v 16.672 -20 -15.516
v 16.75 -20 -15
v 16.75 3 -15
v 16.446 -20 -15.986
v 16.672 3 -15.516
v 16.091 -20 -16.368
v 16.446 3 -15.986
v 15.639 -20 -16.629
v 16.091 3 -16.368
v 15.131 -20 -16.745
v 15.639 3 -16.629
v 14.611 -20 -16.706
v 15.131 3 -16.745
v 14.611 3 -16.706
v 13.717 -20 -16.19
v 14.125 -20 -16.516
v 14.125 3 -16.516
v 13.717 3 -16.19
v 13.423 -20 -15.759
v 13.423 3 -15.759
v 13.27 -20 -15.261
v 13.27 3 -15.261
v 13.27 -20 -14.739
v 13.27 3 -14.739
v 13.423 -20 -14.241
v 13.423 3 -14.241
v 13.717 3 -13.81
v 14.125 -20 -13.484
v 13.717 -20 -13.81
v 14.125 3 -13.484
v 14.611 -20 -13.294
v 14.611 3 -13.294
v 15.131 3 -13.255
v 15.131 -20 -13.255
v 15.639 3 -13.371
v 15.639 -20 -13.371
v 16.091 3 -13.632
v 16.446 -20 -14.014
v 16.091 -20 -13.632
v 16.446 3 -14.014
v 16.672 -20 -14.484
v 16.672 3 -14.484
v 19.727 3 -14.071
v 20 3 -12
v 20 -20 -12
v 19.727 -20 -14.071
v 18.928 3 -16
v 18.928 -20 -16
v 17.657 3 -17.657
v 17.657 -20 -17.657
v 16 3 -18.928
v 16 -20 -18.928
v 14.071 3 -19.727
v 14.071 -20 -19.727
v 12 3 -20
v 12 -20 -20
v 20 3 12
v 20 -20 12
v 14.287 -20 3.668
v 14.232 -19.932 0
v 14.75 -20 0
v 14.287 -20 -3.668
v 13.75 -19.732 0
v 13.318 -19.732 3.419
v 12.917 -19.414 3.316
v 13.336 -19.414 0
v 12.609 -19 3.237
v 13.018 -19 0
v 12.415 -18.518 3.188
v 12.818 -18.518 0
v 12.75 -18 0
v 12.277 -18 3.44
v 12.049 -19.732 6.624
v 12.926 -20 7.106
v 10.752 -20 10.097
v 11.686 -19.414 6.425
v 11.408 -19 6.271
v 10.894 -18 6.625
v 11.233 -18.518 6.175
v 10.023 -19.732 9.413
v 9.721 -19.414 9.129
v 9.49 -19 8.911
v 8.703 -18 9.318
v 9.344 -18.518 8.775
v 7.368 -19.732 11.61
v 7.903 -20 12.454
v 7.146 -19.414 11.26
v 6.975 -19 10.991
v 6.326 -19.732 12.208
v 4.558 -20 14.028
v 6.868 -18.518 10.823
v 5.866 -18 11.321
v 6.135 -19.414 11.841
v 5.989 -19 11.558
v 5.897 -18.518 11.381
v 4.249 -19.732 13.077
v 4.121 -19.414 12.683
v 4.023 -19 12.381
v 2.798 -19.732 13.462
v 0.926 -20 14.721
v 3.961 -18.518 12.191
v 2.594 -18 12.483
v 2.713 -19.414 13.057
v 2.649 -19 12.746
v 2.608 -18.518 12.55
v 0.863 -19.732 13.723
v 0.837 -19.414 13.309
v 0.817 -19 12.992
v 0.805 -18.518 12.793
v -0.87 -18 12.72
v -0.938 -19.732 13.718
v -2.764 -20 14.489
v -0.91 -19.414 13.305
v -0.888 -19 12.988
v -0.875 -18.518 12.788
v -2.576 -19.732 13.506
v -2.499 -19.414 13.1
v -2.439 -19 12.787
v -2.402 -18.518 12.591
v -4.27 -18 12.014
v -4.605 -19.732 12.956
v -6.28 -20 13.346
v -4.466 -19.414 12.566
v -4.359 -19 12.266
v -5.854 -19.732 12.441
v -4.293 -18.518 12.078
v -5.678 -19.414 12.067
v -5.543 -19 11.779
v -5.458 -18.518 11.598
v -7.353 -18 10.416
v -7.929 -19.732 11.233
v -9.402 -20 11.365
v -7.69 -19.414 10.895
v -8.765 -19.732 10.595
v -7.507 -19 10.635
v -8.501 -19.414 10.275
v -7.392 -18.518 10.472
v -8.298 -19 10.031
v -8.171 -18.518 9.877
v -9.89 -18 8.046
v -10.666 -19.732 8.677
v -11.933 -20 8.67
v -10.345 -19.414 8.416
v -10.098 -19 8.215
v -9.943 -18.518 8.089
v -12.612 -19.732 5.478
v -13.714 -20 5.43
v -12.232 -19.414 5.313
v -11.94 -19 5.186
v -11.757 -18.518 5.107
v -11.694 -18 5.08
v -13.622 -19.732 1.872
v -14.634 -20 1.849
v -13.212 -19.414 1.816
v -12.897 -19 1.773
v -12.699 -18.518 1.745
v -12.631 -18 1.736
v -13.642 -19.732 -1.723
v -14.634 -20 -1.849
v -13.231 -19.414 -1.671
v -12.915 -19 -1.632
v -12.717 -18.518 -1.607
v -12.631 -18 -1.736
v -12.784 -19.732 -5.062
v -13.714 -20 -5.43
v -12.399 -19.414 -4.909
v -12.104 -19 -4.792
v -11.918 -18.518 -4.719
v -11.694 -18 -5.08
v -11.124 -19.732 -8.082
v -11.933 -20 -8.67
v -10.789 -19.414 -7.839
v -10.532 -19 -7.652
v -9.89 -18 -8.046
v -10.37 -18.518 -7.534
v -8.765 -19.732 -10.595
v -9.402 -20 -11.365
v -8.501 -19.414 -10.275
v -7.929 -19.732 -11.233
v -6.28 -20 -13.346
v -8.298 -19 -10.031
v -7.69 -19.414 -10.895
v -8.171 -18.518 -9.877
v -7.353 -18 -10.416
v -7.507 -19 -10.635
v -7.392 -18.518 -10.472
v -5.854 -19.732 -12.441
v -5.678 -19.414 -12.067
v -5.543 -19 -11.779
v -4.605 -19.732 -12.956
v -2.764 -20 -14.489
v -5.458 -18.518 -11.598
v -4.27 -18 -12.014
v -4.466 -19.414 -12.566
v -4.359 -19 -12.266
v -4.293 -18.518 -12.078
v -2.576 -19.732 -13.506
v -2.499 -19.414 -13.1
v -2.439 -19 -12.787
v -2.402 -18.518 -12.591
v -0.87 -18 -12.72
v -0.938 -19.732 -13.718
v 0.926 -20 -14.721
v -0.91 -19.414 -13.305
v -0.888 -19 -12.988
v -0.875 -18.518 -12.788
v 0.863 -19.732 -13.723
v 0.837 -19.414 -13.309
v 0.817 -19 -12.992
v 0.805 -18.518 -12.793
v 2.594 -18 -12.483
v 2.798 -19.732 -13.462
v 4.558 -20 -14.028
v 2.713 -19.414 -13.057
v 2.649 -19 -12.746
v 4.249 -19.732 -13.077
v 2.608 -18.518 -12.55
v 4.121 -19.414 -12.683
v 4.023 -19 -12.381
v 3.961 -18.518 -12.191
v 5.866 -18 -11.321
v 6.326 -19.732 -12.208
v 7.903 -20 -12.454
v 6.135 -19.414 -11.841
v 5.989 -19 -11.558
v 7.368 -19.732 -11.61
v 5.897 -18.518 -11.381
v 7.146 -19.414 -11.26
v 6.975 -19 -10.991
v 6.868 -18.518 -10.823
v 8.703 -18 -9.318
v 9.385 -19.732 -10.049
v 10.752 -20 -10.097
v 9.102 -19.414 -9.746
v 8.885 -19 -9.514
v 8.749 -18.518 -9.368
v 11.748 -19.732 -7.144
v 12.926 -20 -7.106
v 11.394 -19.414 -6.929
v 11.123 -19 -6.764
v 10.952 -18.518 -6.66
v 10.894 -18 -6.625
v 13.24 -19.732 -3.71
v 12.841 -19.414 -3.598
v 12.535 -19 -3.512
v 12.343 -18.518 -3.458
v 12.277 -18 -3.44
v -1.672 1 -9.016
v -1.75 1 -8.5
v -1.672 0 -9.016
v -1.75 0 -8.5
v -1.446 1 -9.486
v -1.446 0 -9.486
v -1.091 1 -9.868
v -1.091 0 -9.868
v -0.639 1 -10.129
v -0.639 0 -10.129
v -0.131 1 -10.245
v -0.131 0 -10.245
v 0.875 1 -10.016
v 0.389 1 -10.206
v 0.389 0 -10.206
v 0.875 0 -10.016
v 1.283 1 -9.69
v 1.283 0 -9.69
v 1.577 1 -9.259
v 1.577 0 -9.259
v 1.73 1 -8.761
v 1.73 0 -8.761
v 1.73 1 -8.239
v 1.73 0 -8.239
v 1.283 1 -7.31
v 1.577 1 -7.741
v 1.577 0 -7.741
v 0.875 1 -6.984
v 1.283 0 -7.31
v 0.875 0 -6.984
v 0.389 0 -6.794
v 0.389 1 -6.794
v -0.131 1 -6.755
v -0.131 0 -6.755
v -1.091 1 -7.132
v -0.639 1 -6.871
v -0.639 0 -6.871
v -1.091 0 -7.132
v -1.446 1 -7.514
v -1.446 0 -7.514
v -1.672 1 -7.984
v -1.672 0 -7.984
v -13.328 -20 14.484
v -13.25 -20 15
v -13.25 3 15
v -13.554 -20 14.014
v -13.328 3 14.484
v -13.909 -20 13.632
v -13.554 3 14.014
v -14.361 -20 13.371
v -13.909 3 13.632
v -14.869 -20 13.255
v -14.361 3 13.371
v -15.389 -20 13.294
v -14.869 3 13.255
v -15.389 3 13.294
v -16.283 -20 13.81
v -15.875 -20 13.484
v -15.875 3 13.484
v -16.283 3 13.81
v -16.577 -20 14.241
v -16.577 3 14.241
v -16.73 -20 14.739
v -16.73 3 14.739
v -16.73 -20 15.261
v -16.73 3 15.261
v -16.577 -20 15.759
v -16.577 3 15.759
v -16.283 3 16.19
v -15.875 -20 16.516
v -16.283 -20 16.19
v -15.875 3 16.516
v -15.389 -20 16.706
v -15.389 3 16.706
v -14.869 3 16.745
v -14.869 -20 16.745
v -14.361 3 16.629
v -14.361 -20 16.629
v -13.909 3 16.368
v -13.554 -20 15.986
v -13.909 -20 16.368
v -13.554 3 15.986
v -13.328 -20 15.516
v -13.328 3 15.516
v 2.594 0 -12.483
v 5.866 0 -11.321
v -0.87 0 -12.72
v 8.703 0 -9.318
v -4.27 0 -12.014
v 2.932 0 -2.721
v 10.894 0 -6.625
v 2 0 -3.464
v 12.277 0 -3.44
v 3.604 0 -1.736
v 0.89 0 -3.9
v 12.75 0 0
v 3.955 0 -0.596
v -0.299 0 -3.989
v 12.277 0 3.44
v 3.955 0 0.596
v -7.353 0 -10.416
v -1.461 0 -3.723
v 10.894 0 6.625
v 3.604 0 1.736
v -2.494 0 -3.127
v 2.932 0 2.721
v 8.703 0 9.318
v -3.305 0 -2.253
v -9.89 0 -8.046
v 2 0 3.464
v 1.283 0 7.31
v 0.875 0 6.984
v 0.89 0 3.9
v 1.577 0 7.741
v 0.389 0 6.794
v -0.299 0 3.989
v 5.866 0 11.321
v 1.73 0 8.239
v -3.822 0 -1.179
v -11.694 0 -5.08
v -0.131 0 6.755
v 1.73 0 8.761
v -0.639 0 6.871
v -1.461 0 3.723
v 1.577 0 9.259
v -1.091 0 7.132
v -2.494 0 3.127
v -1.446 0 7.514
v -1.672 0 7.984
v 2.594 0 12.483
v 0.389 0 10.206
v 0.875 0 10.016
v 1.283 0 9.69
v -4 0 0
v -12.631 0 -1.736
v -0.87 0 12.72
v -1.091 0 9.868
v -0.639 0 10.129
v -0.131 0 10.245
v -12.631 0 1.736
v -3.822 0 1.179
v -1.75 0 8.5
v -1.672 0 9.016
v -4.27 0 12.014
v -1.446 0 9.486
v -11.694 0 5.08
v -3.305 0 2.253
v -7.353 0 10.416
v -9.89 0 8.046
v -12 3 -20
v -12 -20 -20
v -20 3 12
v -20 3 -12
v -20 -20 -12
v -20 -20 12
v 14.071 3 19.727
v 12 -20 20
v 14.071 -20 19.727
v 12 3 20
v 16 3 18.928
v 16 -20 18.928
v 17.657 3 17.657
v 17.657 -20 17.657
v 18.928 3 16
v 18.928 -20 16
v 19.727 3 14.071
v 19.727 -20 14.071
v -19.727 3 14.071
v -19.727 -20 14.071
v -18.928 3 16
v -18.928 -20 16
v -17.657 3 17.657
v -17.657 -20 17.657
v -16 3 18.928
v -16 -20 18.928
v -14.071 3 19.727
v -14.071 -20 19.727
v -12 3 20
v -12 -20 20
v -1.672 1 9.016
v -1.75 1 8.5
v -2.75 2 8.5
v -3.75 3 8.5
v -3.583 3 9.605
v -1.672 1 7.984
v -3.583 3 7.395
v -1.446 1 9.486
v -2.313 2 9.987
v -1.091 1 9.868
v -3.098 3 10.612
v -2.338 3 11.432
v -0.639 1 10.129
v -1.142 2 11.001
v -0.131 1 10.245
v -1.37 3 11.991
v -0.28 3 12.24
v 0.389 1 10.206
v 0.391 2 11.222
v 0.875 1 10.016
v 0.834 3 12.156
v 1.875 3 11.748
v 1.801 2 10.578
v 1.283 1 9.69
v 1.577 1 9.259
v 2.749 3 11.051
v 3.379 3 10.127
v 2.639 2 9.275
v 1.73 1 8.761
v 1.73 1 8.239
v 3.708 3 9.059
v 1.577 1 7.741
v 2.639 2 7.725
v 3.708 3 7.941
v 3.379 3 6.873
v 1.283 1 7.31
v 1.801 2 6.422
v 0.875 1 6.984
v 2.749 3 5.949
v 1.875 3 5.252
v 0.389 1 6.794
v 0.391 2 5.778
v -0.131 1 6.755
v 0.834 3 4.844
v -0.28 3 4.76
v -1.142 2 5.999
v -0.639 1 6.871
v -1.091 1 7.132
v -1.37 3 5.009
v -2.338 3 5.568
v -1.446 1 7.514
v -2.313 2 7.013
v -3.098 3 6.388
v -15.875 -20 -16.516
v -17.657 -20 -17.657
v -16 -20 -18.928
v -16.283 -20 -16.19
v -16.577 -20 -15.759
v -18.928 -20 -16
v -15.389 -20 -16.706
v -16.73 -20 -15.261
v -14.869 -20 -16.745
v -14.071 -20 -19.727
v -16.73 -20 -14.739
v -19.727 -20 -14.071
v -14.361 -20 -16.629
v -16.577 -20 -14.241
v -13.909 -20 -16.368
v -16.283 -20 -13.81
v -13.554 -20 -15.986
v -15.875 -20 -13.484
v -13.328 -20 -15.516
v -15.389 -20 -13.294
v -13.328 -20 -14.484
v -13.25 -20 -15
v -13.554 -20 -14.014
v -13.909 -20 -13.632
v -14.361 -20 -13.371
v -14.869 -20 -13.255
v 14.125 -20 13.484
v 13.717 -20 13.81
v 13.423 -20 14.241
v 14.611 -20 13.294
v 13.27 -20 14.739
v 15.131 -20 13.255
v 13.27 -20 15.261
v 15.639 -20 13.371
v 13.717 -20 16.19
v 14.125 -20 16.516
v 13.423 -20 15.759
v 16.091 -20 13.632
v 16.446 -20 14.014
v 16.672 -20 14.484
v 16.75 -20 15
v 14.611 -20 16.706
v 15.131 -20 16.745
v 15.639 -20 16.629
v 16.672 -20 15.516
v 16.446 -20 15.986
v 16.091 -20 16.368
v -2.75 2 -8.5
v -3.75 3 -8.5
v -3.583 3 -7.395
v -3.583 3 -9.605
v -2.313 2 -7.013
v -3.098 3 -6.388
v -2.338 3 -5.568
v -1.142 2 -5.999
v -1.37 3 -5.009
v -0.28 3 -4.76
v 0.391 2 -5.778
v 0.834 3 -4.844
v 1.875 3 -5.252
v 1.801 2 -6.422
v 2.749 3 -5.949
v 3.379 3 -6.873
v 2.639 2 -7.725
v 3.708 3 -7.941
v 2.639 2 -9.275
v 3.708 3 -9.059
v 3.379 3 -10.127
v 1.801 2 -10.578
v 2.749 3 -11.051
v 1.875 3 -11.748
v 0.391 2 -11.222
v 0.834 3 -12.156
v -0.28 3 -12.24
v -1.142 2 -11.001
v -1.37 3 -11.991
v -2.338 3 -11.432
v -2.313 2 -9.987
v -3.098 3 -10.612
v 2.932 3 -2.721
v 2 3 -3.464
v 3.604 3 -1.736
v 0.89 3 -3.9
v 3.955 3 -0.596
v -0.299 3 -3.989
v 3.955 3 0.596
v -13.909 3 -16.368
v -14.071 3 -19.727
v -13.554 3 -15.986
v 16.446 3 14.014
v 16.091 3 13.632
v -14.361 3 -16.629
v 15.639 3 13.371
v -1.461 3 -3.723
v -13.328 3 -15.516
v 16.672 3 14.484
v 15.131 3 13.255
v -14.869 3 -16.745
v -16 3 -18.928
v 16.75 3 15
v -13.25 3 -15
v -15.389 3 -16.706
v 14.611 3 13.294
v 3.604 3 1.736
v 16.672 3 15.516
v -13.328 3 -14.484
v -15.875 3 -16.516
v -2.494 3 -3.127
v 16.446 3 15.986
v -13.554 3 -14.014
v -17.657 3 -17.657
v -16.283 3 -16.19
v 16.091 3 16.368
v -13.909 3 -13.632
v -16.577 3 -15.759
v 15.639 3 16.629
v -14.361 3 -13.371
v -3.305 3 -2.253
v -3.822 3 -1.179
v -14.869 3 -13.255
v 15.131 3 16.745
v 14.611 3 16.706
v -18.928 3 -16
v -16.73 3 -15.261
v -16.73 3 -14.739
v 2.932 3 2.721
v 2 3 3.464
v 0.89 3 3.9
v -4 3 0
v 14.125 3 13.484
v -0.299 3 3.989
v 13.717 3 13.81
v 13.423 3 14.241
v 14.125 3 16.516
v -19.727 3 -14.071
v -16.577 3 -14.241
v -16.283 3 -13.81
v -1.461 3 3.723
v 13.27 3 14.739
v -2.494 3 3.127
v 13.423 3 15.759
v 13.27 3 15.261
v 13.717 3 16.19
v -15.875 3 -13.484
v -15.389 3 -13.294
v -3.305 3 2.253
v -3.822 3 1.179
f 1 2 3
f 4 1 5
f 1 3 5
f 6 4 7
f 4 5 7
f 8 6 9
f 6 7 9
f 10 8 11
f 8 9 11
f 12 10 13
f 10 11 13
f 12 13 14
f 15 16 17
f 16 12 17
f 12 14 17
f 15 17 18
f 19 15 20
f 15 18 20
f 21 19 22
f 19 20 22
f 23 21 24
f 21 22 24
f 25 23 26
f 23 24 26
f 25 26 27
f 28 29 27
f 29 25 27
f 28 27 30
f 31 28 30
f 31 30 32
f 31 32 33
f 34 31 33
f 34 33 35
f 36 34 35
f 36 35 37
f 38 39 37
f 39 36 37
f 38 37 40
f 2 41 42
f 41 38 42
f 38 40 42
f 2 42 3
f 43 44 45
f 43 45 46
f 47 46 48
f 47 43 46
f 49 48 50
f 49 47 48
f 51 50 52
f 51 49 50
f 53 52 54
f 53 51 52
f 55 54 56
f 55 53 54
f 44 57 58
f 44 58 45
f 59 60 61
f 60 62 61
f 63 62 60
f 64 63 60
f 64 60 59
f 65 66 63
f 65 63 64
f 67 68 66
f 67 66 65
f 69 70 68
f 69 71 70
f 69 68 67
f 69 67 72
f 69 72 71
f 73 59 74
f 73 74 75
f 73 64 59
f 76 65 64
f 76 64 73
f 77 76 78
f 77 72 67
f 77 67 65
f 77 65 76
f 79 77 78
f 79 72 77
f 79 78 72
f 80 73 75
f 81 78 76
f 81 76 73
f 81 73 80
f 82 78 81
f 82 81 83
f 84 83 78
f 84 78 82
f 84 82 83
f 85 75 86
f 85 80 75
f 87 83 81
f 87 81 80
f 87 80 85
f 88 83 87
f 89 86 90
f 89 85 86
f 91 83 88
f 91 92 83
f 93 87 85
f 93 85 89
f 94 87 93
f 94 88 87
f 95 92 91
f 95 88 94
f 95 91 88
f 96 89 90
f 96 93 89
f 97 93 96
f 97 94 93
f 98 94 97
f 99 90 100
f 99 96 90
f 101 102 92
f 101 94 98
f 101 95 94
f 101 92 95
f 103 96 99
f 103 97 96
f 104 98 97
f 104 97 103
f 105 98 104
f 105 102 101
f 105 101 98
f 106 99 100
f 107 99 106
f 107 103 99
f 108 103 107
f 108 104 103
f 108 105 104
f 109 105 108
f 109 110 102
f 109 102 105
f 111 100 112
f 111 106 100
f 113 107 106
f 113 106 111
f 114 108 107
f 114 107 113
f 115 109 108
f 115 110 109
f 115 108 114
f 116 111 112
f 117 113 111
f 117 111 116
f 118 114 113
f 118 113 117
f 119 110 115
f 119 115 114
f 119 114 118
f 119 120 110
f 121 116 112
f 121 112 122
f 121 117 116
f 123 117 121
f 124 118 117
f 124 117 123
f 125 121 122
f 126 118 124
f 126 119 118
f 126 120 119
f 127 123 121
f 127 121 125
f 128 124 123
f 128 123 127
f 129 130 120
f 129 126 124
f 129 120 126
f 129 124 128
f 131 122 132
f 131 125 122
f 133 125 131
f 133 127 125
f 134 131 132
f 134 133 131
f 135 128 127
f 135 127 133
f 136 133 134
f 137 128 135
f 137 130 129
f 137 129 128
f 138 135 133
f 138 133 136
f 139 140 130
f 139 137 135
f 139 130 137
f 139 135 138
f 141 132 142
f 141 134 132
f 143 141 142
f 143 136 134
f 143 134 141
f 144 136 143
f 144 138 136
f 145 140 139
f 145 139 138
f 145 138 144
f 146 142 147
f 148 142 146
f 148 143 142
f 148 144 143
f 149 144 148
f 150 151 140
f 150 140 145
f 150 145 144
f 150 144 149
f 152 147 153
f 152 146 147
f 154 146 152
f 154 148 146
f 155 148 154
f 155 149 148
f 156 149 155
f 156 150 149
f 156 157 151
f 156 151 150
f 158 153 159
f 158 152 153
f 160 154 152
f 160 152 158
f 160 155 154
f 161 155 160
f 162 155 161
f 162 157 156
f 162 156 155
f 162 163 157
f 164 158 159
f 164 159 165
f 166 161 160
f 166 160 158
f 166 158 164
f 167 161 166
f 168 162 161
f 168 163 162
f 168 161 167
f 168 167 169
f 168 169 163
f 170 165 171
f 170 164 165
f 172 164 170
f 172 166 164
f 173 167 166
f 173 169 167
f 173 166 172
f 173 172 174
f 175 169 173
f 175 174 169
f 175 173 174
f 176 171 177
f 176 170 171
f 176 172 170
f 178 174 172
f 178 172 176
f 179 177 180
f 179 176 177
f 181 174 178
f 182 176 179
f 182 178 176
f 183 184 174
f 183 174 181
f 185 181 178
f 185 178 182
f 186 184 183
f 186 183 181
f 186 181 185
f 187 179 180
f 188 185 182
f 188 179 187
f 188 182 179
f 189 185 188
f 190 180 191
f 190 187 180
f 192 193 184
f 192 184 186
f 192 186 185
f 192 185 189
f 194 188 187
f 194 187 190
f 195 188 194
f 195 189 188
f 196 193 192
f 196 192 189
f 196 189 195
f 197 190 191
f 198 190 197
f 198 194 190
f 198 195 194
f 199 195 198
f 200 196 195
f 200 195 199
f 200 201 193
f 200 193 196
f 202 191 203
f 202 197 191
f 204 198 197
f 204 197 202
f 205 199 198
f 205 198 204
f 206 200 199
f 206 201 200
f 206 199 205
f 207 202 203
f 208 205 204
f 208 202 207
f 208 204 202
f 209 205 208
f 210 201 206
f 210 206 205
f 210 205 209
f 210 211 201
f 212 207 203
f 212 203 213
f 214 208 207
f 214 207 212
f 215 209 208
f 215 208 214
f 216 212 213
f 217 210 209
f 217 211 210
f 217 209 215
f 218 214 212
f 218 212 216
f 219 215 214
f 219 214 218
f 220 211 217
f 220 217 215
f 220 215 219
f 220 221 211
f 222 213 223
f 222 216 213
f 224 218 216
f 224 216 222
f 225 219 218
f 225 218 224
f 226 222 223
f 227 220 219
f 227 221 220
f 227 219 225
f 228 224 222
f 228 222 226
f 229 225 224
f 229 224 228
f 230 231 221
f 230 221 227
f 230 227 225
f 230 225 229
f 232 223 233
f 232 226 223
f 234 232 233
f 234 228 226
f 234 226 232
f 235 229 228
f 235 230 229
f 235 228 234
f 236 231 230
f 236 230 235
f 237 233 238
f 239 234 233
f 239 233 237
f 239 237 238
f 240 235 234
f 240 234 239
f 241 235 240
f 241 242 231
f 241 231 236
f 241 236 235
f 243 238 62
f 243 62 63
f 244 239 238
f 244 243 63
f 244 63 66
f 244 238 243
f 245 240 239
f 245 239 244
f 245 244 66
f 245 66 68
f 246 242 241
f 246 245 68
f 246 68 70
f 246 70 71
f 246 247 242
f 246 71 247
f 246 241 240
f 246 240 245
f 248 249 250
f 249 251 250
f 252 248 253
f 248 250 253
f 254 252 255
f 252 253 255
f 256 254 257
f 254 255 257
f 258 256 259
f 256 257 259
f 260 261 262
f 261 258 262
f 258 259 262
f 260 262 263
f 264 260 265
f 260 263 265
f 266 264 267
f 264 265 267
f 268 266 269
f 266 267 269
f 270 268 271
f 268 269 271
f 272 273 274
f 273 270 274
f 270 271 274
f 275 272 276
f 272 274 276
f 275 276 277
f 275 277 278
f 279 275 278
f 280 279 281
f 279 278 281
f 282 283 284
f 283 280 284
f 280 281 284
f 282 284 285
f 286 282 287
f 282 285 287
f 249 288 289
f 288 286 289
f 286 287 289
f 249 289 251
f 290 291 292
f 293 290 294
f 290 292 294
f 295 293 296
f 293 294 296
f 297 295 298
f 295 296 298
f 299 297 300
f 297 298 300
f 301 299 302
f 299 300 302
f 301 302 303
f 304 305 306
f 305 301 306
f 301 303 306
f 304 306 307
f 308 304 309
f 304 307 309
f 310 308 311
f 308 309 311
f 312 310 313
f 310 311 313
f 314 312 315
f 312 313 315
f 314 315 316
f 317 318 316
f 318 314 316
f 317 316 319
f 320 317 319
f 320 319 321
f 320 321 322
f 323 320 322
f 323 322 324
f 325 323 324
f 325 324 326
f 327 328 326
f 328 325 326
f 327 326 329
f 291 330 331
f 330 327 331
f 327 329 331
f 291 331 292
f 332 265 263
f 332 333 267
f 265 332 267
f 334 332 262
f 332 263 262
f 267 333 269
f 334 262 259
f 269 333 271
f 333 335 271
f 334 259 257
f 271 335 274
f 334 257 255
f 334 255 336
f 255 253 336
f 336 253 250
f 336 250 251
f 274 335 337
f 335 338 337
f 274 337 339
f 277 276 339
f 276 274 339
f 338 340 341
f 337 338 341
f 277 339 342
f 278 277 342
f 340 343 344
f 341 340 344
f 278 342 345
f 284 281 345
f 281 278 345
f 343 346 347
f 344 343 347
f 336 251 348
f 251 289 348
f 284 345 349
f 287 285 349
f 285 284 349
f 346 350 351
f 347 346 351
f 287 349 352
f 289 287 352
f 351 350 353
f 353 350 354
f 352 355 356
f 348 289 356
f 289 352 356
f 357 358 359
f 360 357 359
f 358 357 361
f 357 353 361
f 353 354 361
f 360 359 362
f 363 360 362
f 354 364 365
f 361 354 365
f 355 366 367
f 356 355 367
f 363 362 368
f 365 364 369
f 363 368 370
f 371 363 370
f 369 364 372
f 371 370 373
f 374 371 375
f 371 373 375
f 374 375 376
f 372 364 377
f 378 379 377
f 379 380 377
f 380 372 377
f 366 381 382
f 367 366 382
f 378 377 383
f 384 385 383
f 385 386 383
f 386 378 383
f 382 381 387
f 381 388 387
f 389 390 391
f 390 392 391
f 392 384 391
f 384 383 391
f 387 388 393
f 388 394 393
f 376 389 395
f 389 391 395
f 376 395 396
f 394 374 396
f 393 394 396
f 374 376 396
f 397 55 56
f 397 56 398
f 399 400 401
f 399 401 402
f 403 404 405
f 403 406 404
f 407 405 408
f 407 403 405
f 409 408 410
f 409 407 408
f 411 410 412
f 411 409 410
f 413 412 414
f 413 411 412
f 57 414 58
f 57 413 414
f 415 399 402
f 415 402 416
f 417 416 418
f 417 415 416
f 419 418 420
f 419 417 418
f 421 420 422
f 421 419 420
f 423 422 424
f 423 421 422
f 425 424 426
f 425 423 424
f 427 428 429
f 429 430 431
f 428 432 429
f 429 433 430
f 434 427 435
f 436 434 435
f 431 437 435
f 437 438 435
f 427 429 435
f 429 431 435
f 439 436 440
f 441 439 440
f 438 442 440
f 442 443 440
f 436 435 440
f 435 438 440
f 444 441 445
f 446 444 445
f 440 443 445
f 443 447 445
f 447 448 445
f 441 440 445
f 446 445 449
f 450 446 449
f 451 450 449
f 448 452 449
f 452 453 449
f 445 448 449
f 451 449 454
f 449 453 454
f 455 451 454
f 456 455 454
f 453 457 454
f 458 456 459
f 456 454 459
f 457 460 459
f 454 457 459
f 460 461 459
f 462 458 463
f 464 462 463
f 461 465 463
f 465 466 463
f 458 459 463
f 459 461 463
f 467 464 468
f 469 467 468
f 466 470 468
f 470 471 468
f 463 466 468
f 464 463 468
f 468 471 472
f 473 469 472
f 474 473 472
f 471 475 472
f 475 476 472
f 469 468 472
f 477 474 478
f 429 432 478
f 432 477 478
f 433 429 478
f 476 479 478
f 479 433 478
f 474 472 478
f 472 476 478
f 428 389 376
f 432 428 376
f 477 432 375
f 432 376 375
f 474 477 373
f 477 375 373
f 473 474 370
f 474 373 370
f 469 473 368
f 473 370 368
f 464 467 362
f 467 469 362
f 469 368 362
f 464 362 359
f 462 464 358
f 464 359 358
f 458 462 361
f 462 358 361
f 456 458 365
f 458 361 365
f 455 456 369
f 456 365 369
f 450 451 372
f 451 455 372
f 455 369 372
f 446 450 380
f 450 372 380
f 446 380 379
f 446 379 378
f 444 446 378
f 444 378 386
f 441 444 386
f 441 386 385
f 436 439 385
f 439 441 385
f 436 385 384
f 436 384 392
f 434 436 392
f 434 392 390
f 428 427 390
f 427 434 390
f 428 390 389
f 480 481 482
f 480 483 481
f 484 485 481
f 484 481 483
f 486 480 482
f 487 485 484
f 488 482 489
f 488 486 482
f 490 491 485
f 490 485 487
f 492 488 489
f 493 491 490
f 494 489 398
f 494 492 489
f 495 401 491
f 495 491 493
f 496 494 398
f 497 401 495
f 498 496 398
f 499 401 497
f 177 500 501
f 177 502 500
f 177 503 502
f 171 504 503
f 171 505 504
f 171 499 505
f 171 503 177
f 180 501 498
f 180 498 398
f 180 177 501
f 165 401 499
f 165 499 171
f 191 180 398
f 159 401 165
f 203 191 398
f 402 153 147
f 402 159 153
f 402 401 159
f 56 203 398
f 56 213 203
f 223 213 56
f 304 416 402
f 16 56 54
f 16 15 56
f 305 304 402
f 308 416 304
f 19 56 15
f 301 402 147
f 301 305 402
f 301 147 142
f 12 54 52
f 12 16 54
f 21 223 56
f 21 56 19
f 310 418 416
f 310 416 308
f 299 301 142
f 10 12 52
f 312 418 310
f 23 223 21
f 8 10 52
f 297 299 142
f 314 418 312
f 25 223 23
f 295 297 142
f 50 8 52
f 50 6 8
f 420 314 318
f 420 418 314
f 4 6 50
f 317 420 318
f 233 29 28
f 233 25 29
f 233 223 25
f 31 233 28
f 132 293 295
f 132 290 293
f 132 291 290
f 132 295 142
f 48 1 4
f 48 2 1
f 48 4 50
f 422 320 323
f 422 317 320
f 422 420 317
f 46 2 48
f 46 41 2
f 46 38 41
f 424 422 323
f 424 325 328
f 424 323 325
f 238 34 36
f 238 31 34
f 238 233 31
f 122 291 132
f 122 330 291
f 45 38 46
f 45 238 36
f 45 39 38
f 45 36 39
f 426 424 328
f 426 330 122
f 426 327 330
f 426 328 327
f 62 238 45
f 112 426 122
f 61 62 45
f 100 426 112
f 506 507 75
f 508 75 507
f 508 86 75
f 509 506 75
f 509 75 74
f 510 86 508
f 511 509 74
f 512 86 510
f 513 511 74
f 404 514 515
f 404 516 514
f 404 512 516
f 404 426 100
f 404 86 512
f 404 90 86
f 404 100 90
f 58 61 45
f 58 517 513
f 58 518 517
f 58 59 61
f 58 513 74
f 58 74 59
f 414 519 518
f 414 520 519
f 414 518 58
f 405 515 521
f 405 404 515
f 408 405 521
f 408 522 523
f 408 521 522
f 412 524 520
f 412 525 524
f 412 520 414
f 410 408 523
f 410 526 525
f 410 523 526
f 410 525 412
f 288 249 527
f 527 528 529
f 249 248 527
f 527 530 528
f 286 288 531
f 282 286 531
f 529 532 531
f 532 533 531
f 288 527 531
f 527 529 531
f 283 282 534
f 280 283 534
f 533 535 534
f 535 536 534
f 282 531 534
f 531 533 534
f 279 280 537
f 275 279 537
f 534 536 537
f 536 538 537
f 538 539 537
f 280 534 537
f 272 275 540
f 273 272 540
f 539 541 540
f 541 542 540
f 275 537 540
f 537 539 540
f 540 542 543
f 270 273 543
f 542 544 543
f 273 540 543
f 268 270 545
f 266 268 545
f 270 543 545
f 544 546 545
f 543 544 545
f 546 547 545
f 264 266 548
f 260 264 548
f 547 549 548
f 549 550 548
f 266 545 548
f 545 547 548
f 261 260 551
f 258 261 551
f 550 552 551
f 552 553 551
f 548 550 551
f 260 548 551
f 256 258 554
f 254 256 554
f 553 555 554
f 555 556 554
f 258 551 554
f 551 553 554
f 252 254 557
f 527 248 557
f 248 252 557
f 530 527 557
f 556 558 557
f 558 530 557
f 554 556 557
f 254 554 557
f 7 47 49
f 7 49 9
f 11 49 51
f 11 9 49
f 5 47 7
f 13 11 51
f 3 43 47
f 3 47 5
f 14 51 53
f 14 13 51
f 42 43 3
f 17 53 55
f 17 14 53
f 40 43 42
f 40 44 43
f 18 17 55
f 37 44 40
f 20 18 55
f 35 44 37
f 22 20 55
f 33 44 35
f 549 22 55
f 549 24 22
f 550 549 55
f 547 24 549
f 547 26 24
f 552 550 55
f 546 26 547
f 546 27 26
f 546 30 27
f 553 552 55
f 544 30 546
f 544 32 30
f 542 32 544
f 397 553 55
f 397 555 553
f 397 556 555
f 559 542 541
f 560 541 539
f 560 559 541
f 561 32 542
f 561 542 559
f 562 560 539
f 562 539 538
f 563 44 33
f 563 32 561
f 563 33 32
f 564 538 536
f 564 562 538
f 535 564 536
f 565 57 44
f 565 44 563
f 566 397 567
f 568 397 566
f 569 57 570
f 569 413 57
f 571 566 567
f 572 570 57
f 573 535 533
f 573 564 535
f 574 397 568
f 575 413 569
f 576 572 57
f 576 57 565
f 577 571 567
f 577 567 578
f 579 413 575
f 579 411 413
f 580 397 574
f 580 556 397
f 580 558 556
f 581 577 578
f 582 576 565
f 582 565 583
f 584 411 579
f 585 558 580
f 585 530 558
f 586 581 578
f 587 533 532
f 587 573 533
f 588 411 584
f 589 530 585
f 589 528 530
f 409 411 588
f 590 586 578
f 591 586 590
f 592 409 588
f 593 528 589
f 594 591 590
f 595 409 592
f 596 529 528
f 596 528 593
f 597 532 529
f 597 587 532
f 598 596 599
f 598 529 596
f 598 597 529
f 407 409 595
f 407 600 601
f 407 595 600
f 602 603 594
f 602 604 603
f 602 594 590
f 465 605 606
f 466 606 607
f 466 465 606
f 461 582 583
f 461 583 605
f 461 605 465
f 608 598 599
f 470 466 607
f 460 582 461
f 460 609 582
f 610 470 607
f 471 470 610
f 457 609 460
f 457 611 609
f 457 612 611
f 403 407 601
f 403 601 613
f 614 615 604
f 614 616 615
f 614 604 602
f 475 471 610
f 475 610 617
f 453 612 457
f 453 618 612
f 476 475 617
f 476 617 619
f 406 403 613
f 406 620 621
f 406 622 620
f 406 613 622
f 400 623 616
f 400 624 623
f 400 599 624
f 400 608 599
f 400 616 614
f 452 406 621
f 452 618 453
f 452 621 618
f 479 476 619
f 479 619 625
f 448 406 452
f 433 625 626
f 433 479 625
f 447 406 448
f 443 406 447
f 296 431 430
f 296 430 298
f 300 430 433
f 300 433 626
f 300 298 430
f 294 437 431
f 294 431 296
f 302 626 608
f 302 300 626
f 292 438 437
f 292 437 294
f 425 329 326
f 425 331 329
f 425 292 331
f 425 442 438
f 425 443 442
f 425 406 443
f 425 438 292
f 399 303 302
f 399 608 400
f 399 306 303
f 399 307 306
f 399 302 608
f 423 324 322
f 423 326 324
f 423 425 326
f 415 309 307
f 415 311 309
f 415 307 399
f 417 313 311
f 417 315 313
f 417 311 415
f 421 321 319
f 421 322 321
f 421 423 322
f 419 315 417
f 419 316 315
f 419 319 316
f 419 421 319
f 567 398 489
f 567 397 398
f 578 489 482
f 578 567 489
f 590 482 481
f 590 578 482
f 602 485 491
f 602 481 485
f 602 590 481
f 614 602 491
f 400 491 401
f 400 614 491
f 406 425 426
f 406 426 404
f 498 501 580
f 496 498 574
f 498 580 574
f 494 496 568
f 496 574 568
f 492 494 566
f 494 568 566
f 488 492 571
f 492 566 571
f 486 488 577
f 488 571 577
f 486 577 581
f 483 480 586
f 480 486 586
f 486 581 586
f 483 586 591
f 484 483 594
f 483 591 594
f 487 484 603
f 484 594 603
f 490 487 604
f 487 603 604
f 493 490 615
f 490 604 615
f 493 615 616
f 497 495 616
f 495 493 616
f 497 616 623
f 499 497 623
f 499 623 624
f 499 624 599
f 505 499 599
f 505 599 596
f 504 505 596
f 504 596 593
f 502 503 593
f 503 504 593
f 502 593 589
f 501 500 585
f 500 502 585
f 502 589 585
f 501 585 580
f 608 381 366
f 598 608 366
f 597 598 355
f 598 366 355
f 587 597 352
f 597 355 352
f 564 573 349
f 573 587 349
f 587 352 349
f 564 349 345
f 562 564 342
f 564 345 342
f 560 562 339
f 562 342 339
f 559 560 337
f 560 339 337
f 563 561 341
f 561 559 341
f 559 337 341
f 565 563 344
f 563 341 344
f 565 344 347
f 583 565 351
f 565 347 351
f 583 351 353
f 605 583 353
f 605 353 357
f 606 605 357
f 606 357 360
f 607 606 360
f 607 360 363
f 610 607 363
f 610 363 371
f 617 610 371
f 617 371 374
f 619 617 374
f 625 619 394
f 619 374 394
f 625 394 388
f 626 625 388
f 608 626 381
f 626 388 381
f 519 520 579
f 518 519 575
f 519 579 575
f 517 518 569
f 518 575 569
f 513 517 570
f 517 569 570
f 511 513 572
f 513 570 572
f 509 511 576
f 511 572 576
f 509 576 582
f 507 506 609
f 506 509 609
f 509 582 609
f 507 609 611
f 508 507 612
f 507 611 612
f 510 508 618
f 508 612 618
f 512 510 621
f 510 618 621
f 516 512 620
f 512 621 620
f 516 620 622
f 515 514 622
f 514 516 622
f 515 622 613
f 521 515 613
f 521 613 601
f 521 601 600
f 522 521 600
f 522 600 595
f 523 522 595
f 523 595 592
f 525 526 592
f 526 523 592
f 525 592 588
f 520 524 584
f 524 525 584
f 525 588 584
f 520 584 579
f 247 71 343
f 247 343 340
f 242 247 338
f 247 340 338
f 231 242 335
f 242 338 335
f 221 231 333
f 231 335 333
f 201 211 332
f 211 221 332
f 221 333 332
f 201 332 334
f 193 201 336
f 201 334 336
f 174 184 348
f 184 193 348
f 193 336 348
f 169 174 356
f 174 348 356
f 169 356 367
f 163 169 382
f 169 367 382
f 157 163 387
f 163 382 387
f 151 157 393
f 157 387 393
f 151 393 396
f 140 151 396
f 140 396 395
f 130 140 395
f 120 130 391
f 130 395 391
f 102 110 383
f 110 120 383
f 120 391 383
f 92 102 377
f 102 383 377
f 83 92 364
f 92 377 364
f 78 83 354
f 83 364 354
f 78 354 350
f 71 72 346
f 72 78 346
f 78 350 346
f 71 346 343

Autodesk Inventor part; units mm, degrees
ref_plane "YZ Plane" through (0, 0, 0) normal (1, 0, 0) x (0, 1, 0)
ref_plane "XZ Plane" through (0, 0, 0) normal (0, 1, 0) x (-1, 0, 0)
ref_plane "XY Plane" through (0, 0, 0) normal (0, 0, 1) x (1, 0, 0)
sketch "Sketch1" plane through (0, 0, 0) normal (0, 1, 0) x (-1, 0, 0)
  line L0 (-20, 20) -> (20, 20)
  line L1 (20, 20) -> (20, -20)
  line L2 (20, -20) -> (-20, -20)
  line L3 (-20, -20) -> (-20, 20)
  line L4 (-20, 20) -> (20, -20) construction
  line L5 (20, 20) -> (-20, -20) construction
  circle A0 centre (0, 0) radius 4
  circle A1 centre (0, 8.5) radius 1.75
  circle A2 centre (0, -8.5) radius 1.75
  point P0 (0, 0)
  point P1 (0, 0)
  dimension "d0" = 40
  dimension "d1" = 40
  dimension "d2" = 8
  dimension "d3" = 3.5
  dimension "d4" = 3.5
  dimension "d5" = 8.5
  dimension "d6" = 8.5
extrude "Extrusion1" add sketch "Sketch1" along normal blind 3
chamfer "Chamfer1" distance 2 angle 45 2 edges at (1.75, 3, -8.5) (1.75, 3, 8.5)
fillet "Fillet1" radius 8 4 edges at (-20, 1.5, -20) (-20, 1.5, 20) (20, 1.5, -20) (20, 1.5, 20)
sketch "Sketch3" plane through (0, 3, 0) normal (0, 1, 0) x (1, 0, 0)
  circle A0 centre (-15, -15) radius 1.75
  circle A1 centre (-15, 15) radius 1.75
  circle A2 centre (15, 15) radius 1.75
  circle A3 centre (15, -15) radius 1.75
  point P0 (0, 0)
  dimension "d13" = 3.5
  dimension "d14" = 15
  dimension "d15" = 15
  dimension "d16" = 15
  dimension "d17" = 15
extrude "Extrusion2" cut sketch "Sketch3" against normal through all
sketch "Sketch4" plane through (0, 0, 0) normal (0, -1, 0) x (1, 0, 0)
  circle A0 centre (0, 0) radius 12.75
  circle A1 centre (-15, 15) radius 1.75 projected
  circle A2 centre (15, -15) radius 1.75 projected
  circle A3 centre (15, 15) radius 1.75 projected
  circle A4 centre (-15, -15) radius 1.75 projected
  arc A5 (20, 12) -> (12, 20) centre (12, 12) ccw projected
  line L0 (-12, 20) -> (12, 20) projected
  arc A6 (-12, 20) -> (-20, 12) centre (-12, 12) ccw projected
  line L1 (-20, -12) -> (-20, 12) projected
  arc A7 (-20, -12) -> (-12, -20) centre (-12, -12) ccw projected
  line L2 (12, -20) -> (-12, -20) projected
  arc A8 (12, -20) -> (20, -12) centre (12, -12) ccw projected
  line L3 (20, 12) -> (20, -12) projected
  circle A9 centre (0, -8.5) radius 1.75 projected
  circle A10 centre (0, 8.5) radius 1.75 projected
  circle A11 centre (0, 0) radius 4 projected
  dimension "d22" = 25.5
extrude "Extrusion3" add sketch "Sketch4" along normal blind 20 contours L3 A8 L2 A7 L1 A6 L0 A5
fillet "Fillet2" radius 2 1 edges at (-12.75, -20, 0)
properties part number "soportemotor"
